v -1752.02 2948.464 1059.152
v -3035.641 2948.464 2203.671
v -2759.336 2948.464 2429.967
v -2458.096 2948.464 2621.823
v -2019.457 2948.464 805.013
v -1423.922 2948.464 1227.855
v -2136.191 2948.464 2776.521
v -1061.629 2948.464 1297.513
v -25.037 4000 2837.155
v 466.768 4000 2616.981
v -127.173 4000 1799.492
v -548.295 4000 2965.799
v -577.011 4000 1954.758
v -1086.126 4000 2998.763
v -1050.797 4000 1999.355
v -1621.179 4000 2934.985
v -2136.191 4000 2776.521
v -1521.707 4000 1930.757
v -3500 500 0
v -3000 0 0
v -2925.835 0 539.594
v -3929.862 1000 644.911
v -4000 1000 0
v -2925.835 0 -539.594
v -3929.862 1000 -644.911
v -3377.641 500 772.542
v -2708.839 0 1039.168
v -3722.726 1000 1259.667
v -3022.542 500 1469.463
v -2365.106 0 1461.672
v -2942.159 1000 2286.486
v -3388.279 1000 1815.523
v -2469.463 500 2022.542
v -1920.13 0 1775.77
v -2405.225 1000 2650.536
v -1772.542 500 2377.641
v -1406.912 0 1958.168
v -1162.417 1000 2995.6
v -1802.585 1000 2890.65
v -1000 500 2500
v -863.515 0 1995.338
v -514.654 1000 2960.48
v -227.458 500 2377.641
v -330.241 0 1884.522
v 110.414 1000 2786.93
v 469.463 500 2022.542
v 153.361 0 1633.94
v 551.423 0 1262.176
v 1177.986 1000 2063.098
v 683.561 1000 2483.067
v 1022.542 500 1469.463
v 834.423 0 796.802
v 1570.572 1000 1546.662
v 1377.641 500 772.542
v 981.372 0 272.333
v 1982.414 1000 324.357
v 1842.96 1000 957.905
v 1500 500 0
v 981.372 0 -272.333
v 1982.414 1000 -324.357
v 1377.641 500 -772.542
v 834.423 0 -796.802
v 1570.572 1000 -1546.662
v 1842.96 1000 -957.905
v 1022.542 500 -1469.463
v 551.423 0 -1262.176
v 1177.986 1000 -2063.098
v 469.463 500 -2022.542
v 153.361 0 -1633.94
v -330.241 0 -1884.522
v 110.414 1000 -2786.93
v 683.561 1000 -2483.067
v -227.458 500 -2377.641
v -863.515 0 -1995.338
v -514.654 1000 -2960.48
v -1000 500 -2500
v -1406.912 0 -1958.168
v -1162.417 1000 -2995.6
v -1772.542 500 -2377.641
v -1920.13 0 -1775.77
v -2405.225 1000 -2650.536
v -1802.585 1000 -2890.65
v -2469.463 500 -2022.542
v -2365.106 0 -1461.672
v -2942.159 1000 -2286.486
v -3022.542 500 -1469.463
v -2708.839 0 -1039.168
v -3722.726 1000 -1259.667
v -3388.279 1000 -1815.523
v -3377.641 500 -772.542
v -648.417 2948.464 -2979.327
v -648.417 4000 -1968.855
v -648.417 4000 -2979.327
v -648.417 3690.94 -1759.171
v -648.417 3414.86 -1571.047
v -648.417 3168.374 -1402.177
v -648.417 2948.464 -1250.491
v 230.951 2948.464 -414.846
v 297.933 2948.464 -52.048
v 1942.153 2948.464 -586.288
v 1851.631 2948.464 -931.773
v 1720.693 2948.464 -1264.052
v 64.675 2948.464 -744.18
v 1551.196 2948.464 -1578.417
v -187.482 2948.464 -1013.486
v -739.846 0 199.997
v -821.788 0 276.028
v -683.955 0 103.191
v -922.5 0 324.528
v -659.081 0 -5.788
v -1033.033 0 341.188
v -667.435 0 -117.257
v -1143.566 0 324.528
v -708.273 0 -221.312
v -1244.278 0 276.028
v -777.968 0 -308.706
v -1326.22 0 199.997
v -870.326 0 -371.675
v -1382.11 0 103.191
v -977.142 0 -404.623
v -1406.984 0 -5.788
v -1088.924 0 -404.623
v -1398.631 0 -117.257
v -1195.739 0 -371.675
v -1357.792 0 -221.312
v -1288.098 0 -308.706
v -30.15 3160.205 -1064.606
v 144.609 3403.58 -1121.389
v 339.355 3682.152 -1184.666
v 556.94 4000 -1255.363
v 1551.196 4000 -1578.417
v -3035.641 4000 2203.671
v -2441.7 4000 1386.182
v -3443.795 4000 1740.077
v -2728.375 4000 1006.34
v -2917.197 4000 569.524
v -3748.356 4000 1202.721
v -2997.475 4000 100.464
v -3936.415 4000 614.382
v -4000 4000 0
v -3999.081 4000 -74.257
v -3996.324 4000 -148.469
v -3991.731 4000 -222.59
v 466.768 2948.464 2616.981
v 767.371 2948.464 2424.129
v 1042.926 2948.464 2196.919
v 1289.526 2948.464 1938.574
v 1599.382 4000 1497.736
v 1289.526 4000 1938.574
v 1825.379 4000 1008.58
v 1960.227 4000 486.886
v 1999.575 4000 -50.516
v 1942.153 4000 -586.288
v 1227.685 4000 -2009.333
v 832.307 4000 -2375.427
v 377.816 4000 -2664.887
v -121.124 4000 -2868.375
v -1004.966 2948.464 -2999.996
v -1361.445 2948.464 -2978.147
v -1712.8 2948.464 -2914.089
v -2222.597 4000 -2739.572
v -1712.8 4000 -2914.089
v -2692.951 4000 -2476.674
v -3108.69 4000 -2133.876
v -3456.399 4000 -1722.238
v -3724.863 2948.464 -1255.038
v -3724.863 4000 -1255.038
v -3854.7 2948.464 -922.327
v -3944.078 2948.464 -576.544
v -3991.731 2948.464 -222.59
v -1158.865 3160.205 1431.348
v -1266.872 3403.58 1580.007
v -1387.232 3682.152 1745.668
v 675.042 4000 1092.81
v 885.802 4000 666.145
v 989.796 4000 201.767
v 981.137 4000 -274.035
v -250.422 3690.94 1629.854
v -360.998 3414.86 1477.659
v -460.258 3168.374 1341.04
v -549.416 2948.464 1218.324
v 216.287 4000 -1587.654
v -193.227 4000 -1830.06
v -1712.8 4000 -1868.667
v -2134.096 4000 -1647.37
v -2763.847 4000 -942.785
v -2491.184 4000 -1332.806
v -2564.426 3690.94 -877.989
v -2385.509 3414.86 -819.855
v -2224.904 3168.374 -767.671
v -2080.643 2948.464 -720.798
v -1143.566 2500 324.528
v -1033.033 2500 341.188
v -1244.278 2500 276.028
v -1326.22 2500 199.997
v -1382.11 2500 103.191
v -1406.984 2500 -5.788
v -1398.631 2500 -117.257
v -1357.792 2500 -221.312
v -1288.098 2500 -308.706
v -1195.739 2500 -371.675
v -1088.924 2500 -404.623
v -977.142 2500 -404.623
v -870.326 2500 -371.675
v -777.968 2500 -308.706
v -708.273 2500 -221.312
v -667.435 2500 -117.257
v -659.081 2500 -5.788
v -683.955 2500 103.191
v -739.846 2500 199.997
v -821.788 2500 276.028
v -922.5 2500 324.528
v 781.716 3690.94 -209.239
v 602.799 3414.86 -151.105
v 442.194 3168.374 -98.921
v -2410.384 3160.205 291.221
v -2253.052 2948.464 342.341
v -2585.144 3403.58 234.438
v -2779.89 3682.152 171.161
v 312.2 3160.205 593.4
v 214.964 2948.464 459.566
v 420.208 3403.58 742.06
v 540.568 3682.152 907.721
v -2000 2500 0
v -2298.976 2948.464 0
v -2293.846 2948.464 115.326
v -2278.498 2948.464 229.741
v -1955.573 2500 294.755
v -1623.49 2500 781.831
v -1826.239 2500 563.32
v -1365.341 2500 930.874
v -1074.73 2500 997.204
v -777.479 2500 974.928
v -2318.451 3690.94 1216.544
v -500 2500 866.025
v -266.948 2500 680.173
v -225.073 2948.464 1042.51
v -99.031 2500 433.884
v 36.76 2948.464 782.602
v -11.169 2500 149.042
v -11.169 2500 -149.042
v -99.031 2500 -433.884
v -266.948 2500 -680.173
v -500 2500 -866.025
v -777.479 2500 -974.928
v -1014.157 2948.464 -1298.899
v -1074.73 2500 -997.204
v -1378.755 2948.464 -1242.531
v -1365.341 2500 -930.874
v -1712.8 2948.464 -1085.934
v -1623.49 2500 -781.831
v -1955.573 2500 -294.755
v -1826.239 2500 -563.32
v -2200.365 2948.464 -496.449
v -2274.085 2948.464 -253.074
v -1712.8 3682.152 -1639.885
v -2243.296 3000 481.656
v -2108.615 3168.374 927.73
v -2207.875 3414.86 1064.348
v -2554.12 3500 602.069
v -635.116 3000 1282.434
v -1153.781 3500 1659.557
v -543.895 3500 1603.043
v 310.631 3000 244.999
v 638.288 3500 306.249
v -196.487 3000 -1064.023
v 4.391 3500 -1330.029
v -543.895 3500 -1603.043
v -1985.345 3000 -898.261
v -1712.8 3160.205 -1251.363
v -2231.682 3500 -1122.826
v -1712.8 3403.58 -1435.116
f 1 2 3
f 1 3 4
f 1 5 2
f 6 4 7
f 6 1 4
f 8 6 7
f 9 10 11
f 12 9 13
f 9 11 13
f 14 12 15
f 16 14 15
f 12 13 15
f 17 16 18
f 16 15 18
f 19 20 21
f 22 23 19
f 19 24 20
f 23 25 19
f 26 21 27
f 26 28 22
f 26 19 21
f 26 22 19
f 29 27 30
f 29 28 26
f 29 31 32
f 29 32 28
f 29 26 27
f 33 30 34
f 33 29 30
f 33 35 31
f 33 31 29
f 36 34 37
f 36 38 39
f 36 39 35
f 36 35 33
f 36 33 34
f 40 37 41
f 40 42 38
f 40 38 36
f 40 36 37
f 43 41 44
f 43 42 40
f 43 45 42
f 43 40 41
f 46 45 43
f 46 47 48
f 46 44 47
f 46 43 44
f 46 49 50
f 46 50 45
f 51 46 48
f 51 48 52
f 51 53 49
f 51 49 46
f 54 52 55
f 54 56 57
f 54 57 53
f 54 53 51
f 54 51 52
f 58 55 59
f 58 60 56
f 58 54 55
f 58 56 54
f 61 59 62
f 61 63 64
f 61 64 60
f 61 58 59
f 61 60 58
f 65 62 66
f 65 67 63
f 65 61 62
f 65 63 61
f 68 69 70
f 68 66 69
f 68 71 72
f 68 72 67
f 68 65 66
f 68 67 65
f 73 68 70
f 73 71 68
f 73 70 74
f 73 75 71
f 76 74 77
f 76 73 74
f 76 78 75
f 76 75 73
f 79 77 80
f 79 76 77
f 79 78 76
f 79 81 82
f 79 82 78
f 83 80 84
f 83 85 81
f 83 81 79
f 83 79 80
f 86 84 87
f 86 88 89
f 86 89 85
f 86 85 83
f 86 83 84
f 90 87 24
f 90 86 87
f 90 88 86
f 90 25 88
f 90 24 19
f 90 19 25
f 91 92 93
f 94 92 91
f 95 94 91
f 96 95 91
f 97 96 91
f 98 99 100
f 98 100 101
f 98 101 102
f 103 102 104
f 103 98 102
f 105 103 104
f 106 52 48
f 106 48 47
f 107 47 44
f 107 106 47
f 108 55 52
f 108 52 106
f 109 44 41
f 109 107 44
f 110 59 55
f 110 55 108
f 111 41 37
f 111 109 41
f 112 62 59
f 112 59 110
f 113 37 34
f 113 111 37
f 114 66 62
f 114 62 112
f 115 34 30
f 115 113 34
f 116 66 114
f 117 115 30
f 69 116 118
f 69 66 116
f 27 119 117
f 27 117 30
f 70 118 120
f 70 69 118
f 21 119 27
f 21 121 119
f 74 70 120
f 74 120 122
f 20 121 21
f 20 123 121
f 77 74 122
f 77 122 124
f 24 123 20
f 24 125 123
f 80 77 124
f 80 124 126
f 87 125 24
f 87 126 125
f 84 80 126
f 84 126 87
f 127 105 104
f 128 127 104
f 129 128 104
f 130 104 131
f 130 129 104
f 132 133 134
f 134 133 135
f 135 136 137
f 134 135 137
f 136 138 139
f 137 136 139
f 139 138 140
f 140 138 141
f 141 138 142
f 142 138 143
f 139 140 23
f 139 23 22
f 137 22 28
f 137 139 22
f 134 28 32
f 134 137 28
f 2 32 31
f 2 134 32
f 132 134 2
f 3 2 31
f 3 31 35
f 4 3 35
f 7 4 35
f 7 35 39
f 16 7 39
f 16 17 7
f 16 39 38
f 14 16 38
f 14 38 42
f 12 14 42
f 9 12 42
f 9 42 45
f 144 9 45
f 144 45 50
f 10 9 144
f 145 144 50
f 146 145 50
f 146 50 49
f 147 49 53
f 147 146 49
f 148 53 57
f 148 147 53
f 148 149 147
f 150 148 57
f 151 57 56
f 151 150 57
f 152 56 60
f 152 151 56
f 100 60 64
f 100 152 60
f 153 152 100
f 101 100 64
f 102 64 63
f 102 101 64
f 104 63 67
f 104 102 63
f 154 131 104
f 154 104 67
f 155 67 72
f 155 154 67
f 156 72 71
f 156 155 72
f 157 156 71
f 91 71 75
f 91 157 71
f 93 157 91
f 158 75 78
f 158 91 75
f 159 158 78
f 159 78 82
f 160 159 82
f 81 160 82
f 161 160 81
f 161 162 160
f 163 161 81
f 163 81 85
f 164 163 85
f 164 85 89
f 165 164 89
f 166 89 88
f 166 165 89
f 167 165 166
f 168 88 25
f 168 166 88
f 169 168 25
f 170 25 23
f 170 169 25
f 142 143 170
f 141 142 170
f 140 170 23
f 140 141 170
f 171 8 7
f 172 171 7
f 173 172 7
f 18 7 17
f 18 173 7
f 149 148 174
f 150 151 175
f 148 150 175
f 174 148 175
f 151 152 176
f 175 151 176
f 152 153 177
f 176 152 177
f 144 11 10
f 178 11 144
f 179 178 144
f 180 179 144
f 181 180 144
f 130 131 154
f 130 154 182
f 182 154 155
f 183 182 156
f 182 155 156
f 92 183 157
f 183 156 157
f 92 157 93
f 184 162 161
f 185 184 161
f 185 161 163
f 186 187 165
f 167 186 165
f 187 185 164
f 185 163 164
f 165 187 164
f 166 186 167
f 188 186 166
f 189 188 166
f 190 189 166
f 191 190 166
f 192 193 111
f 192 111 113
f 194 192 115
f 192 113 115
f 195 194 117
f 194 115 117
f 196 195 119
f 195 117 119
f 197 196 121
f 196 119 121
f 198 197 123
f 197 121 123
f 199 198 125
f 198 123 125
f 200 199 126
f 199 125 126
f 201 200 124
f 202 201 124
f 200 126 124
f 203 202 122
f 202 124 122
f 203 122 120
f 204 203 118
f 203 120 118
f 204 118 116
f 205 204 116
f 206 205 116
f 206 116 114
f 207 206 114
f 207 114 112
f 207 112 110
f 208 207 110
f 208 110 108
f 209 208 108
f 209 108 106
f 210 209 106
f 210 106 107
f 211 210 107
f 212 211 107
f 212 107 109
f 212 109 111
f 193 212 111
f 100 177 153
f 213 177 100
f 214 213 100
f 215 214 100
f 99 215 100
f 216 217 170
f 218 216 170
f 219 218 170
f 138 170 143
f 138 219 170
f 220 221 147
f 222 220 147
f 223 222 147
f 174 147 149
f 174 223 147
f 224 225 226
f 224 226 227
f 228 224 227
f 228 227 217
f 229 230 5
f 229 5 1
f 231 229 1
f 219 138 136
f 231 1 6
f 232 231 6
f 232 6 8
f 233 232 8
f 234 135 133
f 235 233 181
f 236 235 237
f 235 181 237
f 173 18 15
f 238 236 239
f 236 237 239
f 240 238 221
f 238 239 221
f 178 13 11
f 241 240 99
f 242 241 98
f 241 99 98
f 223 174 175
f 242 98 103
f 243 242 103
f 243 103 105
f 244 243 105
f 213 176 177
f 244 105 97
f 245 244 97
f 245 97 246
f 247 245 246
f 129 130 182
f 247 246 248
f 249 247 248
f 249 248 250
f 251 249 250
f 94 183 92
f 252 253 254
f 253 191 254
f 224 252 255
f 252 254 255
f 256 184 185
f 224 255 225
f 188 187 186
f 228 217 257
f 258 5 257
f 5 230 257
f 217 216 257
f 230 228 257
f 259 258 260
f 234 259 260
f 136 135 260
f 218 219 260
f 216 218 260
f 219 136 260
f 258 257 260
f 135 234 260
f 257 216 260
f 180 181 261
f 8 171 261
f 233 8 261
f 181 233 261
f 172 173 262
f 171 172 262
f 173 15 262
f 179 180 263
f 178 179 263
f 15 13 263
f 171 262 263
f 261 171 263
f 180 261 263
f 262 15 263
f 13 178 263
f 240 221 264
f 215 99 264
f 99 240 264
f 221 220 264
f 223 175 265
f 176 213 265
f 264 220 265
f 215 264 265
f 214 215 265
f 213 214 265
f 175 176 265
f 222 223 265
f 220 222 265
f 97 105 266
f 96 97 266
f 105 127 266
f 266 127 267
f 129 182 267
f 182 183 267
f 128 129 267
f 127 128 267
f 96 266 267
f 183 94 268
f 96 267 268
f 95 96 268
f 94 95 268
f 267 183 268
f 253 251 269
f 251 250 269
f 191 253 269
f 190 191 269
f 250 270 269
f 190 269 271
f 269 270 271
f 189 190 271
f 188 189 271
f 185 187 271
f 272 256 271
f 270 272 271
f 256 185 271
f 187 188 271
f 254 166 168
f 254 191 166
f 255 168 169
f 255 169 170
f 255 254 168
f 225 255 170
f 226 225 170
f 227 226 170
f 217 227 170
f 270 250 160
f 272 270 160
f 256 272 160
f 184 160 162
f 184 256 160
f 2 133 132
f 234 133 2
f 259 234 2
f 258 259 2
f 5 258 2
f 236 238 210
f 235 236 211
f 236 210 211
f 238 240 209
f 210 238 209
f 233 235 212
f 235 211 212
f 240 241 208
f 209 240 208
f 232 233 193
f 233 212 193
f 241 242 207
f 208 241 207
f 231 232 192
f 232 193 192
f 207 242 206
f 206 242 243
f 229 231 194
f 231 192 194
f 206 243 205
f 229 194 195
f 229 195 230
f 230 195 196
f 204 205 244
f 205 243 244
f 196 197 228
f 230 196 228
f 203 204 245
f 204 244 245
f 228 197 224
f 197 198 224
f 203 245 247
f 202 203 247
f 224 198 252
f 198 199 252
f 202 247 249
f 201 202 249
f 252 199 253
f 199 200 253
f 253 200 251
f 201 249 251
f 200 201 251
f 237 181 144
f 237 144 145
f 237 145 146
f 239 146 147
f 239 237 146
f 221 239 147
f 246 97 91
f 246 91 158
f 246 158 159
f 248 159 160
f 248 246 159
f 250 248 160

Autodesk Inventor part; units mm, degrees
ref_plane "YZ Plane" through (0, 0, 0) normal (1, 0, 0) x (0, 1, 0)
ref_plane "XZ Plane" through (0, 0, 0) normal (0, 1, 0) x (-1, 0, 0)
ref_plane "XY Plane" through (0, 0, 0) normal (0, 0, 1) x (1, 0, 0)
sketch "Sketch1" plane through (0, 0, 0) normal (0, 0, 1) x (1, 0, 0)
  line L0 (-1000, 0) -> (1000, 0)
  line L1 (1000, 0) -> (2000, 1000)
  line L2 (2000, 1000) -> (2000, 4000)
  line L3 (2000, 4000) -> (1000, 4000)
  line L4 (1000, 4000) -> (0, 2500)
  line L5 (0, 2500) -> (-1000, 2500)
  line L6 (-1000, 2500) -> (-1000, 0)
  line L7 (0, 0) -> (1000, 0)
  line L8 (0, 5771.6776) -> (0, -2566.7005)
  dimension "d3" = 3000
  dimension "d4" = 1000
  dimension "d5" = 1000
  dimension "d6" = 1000
  dimension "d7" = 1000
  dimension "d8" = 1000
  dimension "d9" = 1500
  dimension "d19" = 2000
  dimension "d20" = 1000
revolve "Revolution1" add sketch "Sketch1" angle 360 mid plane about axis through (-1000, 2500, 0) along (0, -1, 0)
sketch "Sketch2" plane through (-1000, 2500, 0) normal (0, 1, 0) x (1, 0, 0)
  point P0 (1000, 0)
  point P1 (-33.0328, 33.8119)
hole "Hole1" at (-1033.0328, 2500, -33.8119) direction (0, -1, 0) diameter 750 end through all
sketch "Sketch3" plane through (0, 0, 0) normal (1, 0, 0) x (0, 1, 0)
  line L0 (0, -408.8119) -> (2500, -408.8119) projected
  line L1 (1553.7538, -844.1655) -> (1553.7538, 452.6685)
  point P0 (0, 0)
sketch "Sketch4" plane through (0, 0, 0) normal (0, 0, 1) x (1, 0, 0)
  line L0 (-1712.8004, 4367.6411) -> (-648.4173, 4367.6411)
  line L1 (-648.4173, 4367.6411) -> (-648.4173, 2948.4636)
  line L2 (-648.4173, 2948.4636) -> (-1712.8004, 2948.4636)
  line L3 (-1712.8004, 2948.4636) -> (-1712.8004, 4367.6411)
  point P0 (0, 0)
extrude "Extrusion1" cut sketch "Sketch4" against normal up to next
pattern_circular "Circular Pattern1" count 5 over 360 about axis through (-1000, 3250, 0) along (0, -1, 0) of "Extrusion1"
properties part number "bucket" material "Wood (Maple)"
